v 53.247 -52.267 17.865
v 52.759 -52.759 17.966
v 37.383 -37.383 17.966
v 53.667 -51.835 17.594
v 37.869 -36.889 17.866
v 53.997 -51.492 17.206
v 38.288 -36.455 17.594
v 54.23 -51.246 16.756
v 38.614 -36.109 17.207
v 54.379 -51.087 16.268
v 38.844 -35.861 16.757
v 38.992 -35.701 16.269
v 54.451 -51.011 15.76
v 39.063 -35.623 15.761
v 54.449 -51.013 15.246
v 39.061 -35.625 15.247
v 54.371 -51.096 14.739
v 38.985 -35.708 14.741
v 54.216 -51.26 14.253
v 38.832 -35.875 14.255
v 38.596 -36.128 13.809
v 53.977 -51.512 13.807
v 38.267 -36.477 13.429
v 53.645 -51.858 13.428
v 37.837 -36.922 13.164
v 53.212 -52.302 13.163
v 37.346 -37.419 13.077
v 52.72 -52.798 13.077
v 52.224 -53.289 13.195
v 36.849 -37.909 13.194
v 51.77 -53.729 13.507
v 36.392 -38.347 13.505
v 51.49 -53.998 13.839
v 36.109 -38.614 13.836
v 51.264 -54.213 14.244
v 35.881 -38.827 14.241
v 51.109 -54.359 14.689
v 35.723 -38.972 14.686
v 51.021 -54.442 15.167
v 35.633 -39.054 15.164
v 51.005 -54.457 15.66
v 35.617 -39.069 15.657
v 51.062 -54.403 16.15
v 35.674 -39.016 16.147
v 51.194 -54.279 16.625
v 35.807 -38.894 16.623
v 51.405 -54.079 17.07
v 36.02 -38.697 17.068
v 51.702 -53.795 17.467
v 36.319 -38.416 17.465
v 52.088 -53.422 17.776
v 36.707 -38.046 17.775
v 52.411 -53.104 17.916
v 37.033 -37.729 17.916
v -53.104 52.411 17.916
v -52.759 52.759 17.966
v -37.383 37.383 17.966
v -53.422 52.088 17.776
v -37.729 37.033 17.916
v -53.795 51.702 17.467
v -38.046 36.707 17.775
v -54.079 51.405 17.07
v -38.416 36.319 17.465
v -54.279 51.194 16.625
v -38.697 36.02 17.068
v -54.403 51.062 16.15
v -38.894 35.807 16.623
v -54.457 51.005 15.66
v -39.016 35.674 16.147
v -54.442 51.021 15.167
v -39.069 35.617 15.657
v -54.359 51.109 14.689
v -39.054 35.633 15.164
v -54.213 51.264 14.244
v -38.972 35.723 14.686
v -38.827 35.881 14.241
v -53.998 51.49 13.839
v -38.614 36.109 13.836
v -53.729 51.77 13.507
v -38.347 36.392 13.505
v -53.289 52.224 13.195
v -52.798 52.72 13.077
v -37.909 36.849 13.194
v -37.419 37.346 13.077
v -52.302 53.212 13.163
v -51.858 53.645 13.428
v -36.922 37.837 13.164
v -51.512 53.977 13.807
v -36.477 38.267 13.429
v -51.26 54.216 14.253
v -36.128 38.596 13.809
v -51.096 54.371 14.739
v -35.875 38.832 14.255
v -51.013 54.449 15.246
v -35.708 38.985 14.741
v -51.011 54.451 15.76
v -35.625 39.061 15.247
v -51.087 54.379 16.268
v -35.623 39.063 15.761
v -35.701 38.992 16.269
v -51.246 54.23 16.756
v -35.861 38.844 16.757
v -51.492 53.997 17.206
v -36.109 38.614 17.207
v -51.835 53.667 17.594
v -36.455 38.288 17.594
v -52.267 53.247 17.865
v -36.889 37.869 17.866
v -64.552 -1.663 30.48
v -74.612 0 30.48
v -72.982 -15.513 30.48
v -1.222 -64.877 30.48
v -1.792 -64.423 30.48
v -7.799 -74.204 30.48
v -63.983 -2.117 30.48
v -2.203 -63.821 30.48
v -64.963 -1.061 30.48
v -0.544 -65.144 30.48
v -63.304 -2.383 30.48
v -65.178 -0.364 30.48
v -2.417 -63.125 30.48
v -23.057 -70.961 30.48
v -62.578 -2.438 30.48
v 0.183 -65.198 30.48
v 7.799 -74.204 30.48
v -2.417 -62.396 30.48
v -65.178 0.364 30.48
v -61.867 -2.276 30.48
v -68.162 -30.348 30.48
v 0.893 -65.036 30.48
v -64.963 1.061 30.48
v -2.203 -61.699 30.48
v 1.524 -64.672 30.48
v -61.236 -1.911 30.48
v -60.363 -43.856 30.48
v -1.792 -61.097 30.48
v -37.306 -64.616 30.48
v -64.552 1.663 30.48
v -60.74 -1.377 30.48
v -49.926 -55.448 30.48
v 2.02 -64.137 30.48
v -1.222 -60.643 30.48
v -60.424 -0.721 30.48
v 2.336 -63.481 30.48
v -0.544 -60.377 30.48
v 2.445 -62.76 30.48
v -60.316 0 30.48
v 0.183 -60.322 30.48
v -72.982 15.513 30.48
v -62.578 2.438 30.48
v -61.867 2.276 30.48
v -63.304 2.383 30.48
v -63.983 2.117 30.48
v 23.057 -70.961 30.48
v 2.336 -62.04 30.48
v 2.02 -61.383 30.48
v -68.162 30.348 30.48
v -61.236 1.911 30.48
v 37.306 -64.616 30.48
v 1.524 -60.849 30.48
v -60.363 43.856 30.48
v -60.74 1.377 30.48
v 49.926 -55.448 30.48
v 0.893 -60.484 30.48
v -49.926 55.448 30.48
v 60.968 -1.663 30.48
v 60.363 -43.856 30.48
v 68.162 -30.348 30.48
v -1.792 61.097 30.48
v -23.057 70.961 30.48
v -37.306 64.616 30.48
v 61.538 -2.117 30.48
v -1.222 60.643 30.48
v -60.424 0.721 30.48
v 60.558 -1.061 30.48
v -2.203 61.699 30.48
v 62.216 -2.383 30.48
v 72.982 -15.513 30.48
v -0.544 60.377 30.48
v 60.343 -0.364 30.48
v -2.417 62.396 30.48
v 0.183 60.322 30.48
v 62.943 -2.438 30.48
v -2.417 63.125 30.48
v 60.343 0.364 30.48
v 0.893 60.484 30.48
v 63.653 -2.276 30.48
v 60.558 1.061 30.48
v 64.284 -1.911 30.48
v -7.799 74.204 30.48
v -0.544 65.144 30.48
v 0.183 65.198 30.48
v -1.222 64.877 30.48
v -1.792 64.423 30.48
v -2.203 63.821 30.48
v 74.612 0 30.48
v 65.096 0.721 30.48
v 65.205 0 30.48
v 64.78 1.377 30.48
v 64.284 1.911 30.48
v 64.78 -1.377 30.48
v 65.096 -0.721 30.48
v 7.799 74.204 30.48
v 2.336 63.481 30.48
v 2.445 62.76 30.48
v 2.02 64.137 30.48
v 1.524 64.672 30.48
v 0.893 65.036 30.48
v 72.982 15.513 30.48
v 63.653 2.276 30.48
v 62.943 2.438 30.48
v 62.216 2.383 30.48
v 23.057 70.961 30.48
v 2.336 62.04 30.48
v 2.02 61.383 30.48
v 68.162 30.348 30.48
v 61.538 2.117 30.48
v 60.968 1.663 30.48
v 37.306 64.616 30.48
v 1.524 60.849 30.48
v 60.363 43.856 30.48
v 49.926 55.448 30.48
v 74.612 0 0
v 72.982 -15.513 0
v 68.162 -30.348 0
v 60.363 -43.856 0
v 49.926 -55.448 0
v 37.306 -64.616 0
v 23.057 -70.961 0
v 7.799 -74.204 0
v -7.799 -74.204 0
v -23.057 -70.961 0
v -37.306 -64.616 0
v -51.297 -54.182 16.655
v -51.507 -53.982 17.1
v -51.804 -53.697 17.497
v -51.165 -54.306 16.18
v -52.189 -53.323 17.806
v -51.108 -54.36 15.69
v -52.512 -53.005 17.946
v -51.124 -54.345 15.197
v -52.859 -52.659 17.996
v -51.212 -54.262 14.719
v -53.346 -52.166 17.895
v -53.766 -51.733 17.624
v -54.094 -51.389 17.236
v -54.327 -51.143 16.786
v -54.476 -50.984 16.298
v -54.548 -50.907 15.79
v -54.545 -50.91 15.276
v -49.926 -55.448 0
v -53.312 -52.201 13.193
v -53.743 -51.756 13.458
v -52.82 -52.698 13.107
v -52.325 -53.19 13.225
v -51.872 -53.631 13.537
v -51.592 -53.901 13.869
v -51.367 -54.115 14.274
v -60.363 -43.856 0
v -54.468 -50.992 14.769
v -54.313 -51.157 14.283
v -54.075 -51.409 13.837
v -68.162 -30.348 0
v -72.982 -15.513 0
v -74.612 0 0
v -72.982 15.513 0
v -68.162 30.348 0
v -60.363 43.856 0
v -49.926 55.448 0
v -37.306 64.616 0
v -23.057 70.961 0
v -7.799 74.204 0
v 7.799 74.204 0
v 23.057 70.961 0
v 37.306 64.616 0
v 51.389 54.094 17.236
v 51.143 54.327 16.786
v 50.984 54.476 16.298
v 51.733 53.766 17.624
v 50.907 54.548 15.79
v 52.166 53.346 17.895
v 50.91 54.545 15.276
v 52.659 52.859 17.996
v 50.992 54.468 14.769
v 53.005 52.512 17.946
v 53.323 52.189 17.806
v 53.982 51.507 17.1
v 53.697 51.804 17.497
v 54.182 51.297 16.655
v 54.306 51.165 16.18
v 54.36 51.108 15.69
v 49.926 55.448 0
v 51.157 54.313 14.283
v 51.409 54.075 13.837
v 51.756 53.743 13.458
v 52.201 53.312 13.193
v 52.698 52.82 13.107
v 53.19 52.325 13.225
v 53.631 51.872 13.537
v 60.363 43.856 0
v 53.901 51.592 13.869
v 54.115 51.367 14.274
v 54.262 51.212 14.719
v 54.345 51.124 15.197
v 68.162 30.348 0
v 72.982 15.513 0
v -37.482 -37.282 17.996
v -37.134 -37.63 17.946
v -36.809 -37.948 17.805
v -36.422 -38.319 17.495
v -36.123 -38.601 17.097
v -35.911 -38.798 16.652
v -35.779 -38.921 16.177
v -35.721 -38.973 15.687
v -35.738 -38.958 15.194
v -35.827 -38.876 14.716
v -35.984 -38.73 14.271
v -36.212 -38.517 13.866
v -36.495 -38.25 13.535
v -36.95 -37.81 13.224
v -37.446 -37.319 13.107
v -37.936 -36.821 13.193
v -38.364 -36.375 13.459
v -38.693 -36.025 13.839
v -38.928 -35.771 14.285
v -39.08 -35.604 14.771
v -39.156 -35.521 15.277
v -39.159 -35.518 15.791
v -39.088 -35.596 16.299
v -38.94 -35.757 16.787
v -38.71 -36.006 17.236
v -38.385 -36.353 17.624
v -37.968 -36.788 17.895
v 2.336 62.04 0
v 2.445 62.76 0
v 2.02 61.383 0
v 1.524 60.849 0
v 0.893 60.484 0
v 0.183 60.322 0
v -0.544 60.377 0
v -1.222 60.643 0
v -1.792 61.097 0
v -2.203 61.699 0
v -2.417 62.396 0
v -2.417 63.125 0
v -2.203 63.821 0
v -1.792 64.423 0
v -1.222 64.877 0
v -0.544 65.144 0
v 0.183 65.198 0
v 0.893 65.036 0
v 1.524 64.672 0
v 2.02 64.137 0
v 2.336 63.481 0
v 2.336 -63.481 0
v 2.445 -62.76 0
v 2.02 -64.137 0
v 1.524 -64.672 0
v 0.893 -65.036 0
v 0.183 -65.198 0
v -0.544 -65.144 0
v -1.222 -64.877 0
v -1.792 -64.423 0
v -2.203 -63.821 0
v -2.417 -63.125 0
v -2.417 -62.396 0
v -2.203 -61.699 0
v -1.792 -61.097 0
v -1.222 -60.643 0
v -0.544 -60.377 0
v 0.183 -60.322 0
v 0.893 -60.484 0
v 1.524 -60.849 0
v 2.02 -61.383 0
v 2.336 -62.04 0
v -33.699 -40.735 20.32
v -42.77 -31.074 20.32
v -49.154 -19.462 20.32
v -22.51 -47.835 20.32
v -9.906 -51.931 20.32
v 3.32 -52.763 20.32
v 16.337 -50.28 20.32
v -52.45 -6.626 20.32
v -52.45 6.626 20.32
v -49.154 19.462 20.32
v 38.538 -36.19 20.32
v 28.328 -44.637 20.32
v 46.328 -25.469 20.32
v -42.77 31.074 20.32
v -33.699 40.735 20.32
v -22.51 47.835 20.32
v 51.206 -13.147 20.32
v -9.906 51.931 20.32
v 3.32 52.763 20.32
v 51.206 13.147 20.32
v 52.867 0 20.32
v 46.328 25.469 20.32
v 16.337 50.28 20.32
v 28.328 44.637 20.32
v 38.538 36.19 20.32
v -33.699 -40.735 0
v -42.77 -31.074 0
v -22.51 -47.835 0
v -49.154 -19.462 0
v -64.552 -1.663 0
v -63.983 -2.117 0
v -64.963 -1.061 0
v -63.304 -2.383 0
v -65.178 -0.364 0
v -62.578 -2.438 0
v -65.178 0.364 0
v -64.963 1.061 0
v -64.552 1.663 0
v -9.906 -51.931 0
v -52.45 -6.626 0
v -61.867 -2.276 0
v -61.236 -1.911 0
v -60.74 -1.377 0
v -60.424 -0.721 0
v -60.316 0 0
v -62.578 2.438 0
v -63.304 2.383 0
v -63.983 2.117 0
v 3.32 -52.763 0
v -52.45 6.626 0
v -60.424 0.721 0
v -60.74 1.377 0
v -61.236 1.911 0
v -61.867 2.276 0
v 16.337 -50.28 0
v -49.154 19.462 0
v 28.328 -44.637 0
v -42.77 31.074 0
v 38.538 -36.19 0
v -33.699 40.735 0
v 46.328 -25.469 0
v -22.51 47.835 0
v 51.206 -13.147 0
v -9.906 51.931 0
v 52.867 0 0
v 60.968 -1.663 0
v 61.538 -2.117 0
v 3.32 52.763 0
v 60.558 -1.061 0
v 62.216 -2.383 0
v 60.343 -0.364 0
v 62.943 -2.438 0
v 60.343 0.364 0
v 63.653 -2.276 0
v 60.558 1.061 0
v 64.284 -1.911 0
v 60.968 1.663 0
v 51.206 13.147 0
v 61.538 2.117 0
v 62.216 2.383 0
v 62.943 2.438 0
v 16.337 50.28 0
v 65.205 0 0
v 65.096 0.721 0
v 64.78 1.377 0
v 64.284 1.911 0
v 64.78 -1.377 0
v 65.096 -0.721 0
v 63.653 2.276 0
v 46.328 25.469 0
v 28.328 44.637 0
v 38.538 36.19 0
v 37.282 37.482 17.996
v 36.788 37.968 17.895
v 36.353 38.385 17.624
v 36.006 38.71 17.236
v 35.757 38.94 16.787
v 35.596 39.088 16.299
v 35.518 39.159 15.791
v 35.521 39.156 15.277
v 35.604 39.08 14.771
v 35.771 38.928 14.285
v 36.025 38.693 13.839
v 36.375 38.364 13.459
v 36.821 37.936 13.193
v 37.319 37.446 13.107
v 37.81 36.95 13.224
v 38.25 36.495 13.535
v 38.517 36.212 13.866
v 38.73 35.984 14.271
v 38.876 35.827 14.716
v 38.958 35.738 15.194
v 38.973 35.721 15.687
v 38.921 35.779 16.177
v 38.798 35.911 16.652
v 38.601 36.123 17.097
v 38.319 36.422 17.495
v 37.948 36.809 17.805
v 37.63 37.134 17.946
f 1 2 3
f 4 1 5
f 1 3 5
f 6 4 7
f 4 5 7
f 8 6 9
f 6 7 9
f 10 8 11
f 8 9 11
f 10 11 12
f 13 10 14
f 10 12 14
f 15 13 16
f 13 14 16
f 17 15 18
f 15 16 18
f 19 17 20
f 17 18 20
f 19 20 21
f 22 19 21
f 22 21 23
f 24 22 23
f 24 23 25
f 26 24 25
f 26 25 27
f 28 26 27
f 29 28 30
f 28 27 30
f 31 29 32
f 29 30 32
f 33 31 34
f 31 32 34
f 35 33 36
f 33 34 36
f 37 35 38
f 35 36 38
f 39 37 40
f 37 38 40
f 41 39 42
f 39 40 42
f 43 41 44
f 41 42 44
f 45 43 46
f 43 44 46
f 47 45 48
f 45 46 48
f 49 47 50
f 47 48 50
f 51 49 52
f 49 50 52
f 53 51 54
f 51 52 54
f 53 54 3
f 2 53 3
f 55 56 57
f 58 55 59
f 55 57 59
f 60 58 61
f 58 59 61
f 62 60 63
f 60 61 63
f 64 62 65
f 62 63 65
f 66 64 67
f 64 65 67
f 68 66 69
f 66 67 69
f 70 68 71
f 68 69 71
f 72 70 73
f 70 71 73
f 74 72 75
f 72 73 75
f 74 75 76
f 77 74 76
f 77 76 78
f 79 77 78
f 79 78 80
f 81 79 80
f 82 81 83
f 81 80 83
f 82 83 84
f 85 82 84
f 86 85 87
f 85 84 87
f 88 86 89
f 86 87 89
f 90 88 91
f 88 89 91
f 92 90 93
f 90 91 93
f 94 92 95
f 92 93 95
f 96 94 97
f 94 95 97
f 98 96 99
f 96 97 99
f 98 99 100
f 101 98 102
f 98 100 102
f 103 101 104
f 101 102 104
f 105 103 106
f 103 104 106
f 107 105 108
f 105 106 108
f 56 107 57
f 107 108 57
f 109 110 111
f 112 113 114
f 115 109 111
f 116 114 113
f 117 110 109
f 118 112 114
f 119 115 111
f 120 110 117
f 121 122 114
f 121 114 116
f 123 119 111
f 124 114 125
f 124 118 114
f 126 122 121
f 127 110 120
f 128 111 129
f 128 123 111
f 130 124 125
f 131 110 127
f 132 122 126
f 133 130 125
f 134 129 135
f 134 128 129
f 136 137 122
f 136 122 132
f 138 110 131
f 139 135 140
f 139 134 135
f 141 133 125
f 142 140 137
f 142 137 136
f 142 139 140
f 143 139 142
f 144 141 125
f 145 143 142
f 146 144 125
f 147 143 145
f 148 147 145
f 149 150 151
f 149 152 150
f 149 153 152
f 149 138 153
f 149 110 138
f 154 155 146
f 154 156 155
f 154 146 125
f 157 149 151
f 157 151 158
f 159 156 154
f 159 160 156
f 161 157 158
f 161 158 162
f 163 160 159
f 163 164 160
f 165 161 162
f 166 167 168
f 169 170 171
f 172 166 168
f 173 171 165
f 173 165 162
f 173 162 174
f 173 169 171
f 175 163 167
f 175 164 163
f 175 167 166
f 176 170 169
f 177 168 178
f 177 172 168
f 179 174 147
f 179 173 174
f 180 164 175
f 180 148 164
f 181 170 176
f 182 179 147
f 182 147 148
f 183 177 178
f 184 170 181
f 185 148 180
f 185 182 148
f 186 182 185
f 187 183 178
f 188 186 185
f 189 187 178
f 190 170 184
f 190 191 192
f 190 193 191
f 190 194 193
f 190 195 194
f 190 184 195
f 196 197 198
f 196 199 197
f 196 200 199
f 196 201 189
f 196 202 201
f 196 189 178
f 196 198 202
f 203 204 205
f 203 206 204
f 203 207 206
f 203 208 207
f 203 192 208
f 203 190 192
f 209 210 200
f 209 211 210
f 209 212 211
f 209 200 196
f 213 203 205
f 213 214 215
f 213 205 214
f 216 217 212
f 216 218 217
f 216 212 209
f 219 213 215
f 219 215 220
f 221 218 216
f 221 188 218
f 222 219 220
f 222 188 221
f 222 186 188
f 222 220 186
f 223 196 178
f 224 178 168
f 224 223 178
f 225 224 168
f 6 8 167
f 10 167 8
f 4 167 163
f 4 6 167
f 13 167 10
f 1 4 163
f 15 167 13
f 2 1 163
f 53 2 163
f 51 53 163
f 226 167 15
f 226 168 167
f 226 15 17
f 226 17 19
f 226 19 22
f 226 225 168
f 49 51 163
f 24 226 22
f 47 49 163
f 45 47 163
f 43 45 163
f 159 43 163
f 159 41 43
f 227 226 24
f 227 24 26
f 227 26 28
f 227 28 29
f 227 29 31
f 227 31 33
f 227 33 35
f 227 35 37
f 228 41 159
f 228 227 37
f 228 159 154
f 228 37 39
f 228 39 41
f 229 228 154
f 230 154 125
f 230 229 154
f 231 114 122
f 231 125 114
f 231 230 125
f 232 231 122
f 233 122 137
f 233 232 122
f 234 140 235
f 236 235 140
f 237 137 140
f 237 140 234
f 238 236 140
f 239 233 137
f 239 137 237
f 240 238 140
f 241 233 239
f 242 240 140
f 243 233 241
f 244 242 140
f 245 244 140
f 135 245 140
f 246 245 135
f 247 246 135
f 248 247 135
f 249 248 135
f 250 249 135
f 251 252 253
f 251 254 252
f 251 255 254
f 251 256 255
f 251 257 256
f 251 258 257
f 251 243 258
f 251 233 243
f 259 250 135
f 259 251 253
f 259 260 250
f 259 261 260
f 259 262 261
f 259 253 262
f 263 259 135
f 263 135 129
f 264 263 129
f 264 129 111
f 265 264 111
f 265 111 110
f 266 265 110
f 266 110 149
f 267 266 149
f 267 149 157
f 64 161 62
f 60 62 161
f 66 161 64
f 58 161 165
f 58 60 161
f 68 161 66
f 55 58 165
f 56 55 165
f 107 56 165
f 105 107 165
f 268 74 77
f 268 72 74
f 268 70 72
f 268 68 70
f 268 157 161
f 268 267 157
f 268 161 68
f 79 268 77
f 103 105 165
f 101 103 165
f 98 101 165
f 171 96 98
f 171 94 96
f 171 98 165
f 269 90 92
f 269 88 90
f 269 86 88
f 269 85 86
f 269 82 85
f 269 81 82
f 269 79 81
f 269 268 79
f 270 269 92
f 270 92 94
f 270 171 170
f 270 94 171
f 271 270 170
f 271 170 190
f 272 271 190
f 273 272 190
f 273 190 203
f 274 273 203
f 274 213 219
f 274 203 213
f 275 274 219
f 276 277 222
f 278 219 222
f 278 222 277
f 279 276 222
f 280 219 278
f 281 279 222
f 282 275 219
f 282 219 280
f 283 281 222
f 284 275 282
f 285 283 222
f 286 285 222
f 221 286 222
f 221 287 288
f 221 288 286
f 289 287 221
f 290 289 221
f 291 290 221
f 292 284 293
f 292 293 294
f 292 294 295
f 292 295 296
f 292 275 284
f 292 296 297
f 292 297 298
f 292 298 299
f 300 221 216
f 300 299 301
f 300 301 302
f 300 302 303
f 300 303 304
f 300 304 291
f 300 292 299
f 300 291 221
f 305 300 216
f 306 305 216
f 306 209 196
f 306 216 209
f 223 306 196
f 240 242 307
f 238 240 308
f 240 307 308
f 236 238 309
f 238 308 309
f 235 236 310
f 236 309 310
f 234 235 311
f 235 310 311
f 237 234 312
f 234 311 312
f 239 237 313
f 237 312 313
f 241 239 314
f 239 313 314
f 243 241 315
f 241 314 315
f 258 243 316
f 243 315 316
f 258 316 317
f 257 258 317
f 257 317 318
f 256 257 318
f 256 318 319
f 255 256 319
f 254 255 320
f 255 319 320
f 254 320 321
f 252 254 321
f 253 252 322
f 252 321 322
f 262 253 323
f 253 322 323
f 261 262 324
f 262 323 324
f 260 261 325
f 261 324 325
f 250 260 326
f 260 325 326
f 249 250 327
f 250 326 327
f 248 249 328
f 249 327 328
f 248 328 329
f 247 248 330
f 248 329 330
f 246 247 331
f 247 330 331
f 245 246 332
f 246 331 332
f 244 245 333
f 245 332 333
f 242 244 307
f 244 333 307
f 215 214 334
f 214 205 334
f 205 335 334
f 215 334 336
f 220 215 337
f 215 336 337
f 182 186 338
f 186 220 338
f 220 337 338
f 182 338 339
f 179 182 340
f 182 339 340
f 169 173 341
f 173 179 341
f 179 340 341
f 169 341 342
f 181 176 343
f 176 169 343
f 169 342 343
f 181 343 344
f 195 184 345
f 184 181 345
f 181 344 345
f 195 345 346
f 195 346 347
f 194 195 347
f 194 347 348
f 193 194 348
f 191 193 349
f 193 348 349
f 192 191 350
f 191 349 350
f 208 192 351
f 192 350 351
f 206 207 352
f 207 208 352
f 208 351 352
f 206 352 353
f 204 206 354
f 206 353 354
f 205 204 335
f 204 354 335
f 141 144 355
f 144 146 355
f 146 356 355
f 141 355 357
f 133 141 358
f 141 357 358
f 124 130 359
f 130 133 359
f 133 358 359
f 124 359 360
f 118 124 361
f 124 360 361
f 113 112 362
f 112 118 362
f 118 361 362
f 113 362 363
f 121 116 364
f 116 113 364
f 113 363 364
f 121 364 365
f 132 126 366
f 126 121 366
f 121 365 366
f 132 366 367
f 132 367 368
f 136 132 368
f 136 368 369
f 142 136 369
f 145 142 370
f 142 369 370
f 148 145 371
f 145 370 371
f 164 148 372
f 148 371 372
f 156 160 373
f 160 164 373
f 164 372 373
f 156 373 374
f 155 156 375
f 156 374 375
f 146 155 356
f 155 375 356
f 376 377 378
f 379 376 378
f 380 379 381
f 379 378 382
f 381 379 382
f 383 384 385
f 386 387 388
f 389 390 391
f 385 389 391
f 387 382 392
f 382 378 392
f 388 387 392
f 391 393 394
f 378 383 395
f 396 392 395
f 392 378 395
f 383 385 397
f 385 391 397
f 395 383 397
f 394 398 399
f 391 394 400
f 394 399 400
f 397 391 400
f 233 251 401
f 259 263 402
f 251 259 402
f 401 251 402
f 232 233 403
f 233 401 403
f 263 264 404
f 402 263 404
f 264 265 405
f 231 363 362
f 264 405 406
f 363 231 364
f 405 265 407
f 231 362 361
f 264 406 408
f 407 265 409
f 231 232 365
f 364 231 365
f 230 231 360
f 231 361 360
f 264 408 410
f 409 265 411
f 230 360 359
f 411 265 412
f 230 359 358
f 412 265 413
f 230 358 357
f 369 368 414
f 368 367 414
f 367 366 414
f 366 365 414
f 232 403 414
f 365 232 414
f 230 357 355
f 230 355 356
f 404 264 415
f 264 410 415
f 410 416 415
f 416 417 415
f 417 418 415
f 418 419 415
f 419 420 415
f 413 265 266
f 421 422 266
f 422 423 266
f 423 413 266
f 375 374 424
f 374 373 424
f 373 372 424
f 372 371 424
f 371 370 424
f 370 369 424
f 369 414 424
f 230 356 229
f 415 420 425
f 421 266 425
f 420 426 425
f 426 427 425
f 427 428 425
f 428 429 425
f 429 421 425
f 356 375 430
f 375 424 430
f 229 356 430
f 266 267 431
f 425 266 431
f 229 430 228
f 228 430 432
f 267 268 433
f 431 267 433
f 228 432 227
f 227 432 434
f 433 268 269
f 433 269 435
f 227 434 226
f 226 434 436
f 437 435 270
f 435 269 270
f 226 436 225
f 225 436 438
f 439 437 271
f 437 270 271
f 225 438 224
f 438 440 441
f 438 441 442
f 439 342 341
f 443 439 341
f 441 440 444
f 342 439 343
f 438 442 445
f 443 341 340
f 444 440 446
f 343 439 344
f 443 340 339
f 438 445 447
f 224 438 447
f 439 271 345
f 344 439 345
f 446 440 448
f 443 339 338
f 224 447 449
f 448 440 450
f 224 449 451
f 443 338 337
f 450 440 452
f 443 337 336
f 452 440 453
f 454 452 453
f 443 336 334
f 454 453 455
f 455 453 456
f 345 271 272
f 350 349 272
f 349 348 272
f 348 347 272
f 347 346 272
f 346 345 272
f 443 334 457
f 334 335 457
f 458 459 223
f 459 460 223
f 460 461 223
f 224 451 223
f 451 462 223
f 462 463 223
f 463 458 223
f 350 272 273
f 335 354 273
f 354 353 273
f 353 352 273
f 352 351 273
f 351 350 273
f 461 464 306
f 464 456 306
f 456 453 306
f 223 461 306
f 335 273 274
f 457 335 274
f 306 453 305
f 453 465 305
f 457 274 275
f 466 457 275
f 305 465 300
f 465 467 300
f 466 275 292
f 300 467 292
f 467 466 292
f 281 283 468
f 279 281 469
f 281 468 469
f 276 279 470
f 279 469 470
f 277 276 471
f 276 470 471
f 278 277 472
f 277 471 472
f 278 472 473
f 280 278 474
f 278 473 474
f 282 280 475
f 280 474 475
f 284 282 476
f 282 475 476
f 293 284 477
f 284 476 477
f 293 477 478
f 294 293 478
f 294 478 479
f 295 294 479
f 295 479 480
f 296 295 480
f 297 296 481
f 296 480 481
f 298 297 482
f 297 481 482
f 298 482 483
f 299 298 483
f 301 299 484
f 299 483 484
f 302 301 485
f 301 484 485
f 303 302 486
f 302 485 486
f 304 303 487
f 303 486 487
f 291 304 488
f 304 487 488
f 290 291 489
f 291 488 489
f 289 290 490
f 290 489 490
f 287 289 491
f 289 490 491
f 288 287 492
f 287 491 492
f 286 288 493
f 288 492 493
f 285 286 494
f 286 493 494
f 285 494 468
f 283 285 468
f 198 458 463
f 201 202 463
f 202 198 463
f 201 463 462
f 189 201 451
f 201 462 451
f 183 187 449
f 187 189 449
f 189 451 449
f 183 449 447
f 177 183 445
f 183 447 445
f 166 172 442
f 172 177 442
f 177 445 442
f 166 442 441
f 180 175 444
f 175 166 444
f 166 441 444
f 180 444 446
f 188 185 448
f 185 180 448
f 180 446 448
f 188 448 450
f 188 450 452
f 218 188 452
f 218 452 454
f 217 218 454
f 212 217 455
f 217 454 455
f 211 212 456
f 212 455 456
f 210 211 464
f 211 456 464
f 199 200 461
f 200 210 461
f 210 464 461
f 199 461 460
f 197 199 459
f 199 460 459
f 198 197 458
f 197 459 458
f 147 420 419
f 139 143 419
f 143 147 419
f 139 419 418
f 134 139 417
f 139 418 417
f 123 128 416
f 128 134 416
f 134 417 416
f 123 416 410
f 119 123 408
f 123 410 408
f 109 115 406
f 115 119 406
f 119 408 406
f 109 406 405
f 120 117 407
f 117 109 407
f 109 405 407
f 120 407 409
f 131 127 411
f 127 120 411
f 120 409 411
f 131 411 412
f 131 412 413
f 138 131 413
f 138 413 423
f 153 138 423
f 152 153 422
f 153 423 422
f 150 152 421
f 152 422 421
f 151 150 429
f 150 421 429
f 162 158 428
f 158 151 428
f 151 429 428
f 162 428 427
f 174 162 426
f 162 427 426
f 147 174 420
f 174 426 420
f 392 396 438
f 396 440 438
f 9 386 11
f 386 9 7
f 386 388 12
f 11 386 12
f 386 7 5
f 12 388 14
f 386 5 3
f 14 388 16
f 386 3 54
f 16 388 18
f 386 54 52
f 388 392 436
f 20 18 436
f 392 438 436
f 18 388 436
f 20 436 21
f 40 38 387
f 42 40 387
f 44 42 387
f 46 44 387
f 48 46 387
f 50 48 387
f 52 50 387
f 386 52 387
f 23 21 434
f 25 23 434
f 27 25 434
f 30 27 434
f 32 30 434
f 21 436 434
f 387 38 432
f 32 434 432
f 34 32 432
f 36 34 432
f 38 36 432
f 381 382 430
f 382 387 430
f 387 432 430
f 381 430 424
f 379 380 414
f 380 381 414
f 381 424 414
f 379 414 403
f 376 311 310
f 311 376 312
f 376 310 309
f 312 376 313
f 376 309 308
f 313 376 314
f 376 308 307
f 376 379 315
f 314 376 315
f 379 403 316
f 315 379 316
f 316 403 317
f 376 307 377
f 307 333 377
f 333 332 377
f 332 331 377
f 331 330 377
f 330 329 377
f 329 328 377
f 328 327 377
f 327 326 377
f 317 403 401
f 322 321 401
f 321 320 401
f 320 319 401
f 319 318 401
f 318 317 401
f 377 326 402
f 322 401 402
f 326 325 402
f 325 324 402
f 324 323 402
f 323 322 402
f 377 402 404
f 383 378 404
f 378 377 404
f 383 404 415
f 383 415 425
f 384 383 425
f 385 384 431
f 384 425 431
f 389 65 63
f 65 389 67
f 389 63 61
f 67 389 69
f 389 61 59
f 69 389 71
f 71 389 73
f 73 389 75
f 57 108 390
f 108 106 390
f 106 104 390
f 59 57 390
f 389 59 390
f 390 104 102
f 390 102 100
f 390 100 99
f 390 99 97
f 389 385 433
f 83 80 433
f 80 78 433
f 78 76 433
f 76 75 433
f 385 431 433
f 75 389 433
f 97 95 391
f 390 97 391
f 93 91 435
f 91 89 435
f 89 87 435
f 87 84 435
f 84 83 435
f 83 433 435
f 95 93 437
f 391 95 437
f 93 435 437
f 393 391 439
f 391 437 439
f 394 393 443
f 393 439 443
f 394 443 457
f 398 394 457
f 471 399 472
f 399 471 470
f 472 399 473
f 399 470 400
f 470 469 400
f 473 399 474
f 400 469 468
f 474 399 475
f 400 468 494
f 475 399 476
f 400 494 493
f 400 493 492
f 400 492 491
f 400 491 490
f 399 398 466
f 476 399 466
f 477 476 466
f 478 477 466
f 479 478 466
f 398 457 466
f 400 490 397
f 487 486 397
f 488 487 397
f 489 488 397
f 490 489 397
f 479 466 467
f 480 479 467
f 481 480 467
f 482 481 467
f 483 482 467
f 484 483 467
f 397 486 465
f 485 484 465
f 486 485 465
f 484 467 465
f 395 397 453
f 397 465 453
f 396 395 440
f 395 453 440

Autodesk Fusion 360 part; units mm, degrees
sketch "Sketch1" plane through (0, 0, 0) normal (0, 0, 1) x (1, 0, 0)
  circle A0 centre (0, 0) radius 74.6125
  circle A1 centre (0, 62.7602) radius 2.4447
  line L0 (0, 74.6125) -> (0, -74.6125) construction
  line L1 (-74.6125, 0) -> (74.6125, 0) construction
  circle A2 centre (0, -62.7602) radius 2.4447
  circle A3 centre (-62.7602, 0) radius 2.4447
  circle A4 centre (62.7602, 0) radius 2.4447
  circle A5 centre (0, 0) radius 52.867
  dimension "d1" = 149.225
  dimension "d2" = 4.8895
  dimension "d3" = 4.8895
  dimension "d4" = 62.7602
  dimension "d5" = 62.7602
extrude "Extrude1" add sketch "Sketch1" along normal blind 30.48 contours A0 | A1 | A2 | A3 | A4 | A5
extrude "Extrude2" cut sketch "Sketch1" along normal blind 30.48 contours A1 | A2 | A3 | A4
ref_plane "WorkPlane1" through (0, 0, 12.125) normal (-0.7071, 0.7071, 0) x (0, 0, 1)
sketch "Sketch3" plane through (0, 0, 0) normal (-0.7071, 0.7071, 0) x (0, 0, 1)
  circle A0 centre (15.5211, 0) radius 2.4447
  dimension "d12" = 4.8895
  dimension "d29" = 15.5211
extrude "Extrude3" cut sketch "Sketch3" along normal blind 63.5 from surface at 44.1325
extrude "Extrude4" cut sketch "Sketch3" against normal blind 63.5 from surface at -44.1325
ref_plane "WorkPlane2" through (0, 0, 12.125) normal (-0.7071, -0.7071, 0) x (0, 0, 1)
sketch "Sketch4" plane through (0, 0, 0) normal (-0.7071, -0.7071, 0) x (0, 0, 1)
  circle A0 centre (15.551, 0.1414) radius 2.4447
  dimension "d20" = 4.8895
extrude "Extrude5" cut sketch "Sketch4" along normal blind 63.5 from surface at 44.1325
extrude "Extrude6" cut sketch "Sketch4" against normal blind 63.5 from surface at -44.1325
extrude "Extrude7" cut sketch "Sketch1" along normal blind 20.32 contours A5
